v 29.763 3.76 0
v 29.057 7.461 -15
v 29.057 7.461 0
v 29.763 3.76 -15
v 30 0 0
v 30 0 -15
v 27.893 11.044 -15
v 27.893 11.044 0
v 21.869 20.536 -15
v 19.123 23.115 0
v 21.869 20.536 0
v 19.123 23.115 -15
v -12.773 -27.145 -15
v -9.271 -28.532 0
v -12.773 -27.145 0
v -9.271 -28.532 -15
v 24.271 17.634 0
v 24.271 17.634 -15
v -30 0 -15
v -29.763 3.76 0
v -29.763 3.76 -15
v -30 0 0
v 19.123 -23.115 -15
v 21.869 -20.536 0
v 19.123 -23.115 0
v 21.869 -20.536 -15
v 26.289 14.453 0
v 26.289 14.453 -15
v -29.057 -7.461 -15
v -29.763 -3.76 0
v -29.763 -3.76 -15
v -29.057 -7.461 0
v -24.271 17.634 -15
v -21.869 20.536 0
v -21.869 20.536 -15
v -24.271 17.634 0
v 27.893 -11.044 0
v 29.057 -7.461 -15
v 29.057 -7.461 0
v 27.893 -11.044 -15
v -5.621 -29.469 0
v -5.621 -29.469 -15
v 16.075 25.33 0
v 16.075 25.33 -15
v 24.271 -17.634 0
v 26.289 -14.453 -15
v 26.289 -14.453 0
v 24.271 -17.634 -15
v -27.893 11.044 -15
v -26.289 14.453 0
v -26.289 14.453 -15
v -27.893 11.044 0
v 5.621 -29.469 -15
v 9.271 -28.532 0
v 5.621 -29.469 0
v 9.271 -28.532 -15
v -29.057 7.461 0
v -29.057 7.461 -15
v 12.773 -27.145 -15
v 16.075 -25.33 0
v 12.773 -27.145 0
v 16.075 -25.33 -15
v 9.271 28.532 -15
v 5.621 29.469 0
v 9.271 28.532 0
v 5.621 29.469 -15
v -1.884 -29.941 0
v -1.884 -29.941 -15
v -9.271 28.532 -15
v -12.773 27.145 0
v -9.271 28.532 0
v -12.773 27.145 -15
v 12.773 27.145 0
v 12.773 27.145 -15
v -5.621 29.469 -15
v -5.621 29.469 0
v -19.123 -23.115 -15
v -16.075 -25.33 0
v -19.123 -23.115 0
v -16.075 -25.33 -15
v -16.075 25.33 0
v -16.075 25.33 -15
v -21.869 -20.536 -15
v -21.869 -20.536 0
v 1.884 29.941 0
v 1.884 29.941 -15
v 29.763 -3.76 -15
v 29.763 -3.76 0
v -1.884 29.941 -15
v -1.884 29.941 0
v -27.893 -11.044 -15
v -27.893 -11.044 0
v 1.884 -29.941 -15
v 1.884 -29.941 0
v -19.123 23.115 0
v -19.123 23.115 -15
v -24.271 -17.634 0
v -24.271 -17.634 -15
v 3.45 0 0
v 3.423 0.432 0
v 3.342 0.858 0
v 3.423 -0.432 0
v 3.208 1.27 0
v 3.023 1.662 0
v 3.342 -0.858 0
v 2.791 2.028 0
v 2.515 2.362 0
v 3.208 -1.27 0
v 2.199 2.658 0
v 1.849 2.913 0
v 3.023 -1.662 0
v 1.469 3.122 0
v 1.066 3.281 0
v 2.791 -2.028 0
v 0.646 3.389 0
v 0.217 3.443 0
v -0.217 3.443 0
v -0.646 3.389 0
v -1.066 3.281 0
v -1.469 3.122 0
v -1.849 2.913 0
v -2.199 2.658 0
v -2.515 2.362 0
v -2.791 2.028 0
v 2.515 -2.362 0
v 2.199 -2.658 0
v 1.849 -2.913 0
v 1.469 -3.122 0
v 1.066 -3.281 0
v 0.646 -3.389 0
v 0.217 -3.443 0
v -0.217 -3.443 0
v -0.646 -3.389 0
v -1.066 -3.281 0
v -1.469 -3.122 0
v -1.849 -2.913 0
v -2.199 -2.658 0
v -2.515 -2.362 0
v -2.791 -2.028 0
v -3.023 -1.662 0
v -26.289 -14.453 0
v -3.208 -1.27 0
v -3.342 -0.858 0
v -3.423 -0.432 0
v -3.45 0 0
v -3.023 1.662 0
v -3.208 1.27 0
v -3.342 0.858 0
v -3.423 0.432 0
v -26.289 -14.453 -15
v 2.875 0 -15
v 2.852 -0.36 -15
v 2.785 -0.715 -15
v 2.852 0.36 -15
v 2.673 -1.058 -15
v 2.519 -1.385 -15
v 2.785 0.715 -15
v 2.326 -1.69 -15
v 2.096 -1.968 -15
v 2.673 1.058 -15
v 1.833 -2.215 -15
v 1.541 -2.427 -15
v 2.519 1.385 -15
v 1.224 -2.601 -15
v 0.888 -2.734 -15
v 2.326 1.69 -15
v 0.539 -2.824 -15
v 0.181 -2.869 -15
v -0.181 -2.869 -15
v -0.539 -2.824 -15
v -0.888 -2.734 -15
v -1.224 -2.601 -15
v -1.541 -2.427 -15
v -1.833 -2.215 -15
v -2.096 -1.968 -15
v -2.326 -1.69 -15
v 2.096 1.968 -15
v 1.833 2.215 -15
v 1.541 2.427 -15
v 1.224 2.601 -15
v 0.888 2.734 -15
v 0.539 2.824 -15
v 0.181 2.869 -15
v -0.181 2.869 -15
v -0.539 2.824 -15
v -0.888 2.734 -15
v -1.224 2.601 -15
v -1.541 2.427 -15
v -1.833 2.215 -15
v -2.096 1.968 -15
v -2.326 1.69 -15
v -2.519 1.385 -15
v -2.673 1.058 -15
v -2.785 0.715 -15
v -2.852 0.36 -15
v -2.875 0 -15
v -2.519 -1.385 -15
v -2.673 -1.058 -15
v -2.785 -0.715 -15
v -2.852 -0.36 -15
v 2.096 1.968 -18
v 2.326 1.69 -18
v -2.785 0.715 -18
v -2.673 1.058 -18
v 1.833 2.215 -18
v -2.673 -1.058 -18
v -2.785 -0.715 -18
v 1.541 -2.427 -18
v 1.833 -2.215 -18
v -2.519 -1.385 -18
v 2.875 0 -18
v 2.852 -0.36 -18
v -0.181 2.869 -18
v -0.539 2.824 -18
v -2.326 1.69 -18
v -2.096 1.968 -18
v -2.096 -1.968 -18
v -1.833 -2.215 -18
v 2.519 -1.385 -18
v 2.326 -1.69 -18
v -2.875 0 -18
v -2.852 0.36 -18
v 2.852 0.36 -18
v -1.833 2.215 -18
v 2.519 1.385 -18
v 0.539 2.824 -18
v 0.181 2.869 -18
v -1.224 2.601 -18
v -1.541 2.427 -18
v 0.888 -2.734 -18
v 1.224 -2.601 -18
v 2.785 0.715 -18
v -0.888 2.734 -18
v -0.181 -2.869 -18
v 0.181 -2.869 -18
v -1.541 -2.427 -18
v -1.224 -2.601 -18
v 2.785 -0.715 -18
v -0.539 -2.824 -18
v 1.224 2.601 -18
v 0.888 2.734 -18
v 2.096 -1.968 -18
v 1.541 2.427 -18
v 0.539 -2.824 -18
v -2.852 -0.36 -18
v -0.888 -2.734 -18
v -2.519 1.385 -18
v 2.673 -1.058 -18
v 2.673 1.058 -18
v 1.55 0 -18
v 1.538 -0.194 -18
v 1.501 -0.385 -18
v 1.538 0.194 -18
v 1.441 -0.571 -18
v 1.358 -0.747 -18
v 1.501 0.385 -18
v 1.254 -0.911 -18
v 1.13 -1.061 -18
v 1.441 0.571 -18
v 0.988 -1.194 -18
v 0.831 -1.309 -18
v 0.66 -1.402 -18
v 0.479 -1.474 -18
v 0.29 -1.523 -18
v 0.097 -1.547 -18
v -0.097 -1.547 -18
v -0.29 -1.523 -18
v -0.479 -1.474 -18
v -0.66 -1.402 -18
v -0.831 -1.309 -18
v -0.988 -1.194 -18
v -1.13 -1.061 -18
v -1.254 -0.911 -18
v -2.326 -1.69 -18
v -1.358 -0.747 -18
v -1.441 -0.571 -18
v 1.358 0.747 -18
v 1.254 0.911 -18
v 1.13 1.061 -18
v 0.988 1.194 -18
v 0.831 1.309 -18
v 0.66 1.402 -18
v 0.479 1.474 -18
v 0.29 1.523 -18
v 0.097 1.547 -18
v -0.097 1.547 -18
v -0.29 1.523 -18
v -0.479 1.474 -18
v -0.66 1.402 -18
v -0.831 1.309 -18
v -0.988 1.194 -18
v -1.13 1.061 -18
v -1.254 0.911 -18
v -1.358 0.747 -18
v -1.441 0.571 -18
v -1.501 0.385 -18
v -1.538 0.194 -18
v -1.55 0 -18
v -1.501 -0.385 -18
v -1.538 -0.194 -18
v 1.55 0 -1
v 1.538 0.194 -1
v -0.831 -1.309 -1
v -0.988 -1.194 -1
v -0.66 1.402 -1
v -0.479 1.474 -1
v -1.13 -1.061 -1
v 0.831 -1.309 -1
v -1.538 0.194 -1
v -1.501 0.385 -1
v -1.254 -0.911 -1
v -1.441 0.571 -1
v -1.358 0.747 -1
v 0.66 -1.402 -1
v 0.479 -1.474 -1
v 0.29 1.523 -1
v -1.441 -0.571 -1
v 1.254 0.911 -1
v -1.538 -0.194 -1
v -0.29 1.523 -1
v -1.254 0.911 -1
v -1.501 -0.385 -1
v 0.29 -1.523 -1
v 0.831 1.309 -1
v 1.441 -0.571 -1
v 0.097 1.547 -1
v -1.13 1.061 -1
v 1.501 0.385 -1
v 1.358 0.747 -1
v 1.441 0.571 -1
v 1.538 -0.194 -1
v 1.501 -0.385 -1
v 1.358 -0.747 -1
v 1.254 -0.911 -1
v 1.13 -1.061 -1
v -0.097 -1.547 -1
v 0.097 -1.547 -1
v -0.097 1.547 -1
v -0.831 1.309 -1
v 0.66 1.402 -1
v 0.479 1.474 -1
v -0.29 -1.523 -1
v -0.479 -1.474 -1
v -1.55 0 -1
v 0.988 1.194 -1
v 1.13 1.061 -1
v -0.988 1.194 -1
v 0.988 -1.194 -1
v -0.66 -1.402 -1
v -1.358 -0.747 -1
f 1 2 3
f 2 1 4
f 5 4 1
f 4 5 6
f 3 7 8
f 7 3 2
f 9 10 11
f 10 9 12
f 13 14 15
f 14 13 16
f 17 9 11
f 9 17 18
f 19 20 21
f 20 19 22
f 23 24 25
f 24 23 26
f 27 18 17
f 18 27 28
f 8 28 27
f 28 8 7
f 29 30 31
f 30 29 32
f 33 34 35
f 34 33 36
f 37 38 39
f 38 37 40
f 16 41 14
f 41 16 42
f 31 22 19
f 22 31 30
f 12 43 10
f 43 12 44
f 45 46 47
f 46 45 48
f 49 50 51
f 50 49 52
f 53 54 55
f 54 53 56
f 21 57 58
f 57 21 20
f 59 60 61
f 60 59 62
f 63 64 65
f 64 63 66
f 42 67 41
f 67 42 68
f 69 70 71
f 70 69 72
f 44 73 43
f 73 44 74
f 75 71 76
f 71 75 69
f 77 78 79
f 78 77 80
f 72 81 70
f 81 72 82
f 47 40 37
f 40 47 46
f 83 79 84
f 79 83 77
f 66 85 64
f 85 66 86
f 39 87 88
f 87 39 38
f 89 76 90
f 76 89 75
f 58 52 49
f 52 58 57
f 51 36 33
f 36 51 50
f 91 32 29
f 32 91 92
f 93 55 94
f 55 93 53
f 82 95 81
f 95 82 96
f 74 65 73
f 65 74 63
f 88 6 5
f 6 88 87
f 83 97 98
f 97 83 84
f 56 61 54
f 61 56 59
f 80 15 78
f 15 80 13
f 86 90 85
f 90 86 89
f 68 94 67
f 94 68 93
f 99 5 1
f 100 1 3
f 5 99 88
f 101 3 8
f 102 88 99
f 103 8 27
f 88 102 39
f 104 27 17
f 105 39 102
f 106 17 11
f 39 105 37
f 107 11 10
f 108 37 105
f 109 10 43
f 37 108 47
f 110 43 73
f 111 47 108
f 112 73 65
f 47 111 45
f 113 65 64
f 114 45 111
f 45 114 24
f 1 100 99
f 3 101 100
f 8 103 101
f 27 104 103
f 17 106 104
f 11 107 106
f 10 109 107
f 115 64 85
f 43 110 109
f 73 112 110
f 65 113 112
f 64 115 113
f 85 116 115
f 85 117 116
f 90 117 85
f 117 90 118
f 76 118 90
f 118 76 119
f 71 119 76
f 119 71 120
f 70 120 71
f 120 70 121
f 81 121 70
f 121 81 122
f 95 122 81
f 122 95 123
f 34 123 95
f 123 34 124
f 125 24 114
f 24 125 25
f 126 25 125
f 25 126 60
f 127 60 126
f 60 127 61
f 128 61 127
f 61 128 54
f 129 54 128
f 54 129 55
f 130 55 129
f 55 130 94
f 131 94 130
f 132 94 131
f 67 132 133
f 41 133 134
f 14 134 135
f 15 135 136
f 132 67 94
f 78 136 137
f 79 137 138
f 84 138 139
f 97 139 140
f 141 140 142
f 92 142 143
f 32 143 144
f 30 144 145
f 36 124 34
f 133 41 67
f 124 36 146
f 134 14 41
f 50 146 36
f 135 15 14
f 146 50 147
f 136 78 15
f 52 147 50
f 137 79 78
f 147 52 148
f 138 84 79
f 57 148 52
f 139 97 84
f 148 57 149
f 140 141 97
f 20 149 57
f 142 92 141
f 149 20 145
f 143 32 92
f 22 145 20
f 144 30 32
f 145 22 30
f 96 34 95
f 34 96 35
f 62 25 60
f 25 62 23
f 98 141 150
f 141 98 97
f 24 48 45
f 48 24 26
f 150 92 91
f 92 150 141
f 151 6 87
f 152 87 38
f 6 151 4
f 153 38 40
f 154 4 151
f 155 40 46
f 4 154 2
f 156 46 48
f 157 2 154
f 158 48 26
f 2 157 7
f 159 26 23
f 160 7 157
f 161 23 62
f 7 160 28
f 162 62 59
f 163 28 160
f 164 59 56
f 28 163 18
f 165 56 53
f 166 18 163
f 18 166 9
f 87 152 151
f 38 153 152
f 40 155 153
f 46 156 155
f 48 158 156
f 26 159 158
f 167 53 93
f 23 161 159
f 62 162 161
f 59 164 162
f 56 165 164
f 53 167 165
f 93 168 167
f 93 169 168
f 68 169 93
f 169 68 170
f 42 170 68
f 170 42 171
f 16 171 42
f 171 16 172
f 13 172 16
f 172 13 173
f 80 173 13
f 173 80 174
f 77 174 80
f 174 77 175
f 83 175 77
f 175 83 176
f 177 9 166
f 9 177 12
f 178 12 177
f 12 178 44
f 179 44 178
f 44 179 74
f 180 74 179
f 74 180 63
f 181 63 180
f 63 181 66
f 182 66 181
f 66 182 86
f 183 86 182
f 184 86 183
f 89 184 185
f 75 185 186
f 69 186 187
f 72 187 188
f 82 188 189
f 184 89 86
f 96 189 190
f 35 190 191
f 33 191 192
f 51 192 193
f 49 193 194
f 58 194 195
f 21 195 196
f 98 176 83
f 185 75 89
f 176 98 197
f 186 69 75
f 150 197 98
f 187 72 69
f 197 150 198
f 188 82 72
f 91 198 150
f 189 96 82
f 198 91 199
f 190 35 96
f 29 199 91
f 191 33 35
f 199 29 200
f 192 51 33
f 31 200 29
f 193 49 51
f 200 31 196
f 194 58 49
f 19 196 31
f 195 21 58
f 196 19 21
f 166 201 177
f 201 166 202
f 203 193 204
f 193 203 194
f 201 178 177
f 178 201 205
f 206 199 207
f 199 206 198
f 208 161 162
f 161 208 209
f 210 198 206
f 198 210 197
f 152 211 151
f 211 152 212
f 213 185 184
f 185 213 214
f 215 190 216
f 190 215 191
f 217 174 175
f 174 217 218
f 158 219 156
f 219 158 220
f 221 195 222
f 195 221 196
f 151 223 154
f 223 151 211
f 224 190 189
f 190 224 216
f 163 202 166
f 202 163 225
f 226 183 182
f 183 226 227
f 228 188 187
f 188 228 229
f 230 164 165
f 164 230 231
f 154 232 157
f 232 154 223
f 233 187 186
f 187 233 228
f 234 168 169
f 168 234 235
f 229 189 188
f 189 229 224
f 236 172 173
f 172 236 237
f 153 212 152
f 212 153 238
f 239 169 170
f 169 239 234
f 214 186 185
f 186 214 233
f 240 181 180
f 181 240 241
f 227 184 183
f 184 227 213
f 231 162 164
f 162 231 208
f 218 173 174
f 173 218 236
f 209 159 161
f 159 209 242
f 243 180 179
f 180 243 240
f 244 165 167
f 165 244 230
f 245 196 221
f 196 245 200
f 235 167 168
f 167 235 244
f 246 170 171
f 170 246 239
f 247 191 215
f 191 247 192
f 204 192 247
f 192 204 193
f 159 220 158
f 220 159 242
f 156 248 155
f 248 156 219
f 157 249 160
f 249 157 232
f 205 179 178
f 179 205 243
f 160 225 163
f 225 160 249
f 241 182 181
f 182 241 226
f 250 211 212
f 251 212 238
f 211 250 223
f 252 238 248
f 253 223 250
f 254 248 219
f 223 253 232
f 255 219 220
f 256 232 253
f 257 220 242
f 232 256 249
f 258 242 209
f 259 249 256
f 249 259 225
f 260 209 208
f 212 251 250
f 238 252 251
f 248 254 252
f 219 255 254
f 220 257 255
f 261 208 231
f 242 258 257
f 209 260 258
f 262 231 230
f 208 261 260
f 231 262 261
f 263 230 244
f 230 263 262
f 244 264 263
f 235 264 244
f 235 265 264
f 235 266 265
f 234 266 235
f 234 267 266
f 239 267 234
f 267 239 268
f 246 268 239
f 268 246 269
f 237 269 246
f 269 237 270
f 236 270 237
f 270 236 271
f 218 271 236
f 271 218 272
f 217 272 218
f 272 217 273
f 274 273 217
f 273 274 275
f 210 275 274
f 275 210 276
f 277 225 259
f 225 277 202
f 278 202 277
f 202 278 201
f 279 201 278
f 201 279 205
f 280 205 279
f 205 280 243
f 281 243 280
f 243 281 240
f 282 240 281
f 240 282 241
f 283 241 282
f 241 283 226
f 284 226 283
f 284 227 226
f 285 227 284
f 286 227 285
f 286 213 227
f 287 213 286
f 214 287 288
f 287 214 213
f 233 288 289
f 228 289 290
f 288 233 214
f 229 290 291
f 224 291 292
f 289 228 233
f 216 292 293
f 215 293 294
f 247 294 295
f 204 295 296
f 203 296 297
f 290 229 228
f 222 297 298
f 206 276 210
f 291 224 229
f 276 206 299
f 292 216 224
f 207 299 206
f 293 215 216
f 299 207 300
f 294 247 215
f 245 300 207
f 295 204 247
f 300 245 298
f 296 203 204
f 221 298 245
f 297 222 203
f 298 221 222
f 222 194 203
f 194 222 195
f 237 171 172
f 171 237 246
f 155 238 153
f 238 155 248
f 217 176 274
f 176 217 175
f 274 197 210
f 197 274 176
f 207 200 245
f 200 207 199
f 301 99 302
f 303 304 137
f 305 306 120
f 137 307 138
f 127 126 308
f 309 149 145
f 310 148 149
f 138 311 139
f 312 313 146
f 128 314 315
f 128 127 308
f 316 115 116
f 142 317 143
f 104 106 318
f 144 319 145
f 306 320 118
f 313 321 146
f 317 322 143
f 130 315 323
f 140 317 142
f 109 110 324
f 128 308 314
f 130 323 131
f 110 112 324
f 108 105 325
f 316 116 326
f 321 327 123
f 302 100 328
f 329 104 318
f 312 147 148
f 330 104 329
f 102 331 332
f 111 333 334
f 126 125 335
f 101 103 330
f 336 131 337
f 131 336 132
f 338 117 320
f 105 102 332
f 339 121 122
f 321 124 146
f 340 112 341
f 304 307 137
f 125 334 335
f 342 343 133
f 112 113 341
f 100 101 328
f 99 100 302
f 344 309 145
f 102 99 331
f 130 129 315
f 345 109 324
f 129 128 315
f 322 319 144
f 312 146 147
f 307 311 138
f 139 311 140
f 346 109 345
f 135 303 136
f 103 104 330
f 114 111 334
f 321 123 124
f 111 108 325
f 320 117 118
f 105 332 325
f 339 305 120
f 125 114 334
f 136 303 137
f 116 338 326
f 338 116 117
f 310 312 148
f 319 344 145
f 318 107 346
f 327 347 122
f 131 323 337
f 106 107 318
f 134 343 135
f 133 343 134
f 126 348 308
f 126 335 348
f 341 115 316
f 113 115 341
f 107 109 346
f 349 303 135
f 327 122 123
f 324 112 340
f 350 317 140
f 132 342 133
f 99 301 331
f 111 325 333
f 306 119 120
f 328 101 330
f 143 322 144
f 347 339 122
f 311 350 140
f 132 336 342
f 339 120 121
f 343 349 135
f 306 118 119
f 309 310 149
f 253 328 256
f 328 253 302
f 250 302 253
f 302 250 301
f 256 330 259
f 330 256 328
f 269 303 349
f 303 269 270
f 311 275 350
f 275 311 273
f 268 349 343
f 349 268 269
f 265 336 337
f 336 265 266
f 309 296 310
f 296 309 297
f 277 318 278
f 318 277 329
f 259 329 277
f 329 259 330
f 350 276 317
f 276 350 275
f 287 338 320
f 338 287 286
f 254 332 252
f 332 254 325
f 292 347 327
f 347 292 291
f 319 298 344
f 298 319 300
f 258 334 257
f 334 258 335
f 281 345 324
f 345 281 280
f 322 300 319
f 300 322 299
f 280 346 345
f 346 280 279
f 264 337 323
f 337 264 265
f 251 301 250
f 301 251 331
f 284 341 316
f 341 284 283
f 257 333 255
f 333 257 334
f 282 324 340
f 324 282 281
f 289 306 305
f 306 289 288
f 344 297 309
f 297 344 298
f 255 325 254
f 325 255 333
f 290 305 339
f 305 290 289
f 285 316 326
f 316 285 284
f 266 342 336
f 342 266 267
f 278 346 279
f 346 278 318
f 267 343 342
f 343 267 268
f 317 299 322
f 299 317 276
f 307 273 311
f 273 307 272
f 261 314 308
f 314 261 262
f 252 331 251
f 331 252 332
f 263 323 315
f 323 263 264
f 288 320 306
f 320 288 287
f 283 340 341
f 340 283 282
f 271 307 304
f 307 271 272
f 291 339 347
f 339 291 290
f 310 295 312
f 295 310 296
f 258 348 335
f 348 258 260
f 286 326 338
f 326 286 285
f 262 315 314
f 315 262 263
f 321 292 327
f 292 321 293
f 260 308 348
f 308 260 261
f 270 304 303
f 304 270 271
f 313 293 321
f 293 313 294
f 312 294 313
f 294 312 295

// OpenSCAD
$fn = 50;

difference() {
	union() {
		translate(v = [0, 0, -15.0]) {
			cylinder(h = 15, r = 30.0);
		}
		#translate(v = [0, 0, -18.0]) {
			cylinder(h = 18, r = 2.875);
		}
	}
	union() {
		translate(v = [0, 0, 0]) {
			rotate(a = [0, 0, 0]) {
				difference() {
					union() {
						translate(v = [0, 0, -18.0]) {
							cylinder(h = 18, r = 1.25);
						}
						translate(v = [0, 0, -1.0]) {
							cylinder(h = 1.0, r1 = 1.55, r2 = 3.45);
						}
						translate(v = [0, 0, -18.0]) {
							cylinder(h = 18, r = 1.55);
						}
						translate(v = [0, 0, -18.0]) {
							cylinder(h = 18, r = 1.25);
						}
					}
					union();
				}
			}
		}
	}
}
